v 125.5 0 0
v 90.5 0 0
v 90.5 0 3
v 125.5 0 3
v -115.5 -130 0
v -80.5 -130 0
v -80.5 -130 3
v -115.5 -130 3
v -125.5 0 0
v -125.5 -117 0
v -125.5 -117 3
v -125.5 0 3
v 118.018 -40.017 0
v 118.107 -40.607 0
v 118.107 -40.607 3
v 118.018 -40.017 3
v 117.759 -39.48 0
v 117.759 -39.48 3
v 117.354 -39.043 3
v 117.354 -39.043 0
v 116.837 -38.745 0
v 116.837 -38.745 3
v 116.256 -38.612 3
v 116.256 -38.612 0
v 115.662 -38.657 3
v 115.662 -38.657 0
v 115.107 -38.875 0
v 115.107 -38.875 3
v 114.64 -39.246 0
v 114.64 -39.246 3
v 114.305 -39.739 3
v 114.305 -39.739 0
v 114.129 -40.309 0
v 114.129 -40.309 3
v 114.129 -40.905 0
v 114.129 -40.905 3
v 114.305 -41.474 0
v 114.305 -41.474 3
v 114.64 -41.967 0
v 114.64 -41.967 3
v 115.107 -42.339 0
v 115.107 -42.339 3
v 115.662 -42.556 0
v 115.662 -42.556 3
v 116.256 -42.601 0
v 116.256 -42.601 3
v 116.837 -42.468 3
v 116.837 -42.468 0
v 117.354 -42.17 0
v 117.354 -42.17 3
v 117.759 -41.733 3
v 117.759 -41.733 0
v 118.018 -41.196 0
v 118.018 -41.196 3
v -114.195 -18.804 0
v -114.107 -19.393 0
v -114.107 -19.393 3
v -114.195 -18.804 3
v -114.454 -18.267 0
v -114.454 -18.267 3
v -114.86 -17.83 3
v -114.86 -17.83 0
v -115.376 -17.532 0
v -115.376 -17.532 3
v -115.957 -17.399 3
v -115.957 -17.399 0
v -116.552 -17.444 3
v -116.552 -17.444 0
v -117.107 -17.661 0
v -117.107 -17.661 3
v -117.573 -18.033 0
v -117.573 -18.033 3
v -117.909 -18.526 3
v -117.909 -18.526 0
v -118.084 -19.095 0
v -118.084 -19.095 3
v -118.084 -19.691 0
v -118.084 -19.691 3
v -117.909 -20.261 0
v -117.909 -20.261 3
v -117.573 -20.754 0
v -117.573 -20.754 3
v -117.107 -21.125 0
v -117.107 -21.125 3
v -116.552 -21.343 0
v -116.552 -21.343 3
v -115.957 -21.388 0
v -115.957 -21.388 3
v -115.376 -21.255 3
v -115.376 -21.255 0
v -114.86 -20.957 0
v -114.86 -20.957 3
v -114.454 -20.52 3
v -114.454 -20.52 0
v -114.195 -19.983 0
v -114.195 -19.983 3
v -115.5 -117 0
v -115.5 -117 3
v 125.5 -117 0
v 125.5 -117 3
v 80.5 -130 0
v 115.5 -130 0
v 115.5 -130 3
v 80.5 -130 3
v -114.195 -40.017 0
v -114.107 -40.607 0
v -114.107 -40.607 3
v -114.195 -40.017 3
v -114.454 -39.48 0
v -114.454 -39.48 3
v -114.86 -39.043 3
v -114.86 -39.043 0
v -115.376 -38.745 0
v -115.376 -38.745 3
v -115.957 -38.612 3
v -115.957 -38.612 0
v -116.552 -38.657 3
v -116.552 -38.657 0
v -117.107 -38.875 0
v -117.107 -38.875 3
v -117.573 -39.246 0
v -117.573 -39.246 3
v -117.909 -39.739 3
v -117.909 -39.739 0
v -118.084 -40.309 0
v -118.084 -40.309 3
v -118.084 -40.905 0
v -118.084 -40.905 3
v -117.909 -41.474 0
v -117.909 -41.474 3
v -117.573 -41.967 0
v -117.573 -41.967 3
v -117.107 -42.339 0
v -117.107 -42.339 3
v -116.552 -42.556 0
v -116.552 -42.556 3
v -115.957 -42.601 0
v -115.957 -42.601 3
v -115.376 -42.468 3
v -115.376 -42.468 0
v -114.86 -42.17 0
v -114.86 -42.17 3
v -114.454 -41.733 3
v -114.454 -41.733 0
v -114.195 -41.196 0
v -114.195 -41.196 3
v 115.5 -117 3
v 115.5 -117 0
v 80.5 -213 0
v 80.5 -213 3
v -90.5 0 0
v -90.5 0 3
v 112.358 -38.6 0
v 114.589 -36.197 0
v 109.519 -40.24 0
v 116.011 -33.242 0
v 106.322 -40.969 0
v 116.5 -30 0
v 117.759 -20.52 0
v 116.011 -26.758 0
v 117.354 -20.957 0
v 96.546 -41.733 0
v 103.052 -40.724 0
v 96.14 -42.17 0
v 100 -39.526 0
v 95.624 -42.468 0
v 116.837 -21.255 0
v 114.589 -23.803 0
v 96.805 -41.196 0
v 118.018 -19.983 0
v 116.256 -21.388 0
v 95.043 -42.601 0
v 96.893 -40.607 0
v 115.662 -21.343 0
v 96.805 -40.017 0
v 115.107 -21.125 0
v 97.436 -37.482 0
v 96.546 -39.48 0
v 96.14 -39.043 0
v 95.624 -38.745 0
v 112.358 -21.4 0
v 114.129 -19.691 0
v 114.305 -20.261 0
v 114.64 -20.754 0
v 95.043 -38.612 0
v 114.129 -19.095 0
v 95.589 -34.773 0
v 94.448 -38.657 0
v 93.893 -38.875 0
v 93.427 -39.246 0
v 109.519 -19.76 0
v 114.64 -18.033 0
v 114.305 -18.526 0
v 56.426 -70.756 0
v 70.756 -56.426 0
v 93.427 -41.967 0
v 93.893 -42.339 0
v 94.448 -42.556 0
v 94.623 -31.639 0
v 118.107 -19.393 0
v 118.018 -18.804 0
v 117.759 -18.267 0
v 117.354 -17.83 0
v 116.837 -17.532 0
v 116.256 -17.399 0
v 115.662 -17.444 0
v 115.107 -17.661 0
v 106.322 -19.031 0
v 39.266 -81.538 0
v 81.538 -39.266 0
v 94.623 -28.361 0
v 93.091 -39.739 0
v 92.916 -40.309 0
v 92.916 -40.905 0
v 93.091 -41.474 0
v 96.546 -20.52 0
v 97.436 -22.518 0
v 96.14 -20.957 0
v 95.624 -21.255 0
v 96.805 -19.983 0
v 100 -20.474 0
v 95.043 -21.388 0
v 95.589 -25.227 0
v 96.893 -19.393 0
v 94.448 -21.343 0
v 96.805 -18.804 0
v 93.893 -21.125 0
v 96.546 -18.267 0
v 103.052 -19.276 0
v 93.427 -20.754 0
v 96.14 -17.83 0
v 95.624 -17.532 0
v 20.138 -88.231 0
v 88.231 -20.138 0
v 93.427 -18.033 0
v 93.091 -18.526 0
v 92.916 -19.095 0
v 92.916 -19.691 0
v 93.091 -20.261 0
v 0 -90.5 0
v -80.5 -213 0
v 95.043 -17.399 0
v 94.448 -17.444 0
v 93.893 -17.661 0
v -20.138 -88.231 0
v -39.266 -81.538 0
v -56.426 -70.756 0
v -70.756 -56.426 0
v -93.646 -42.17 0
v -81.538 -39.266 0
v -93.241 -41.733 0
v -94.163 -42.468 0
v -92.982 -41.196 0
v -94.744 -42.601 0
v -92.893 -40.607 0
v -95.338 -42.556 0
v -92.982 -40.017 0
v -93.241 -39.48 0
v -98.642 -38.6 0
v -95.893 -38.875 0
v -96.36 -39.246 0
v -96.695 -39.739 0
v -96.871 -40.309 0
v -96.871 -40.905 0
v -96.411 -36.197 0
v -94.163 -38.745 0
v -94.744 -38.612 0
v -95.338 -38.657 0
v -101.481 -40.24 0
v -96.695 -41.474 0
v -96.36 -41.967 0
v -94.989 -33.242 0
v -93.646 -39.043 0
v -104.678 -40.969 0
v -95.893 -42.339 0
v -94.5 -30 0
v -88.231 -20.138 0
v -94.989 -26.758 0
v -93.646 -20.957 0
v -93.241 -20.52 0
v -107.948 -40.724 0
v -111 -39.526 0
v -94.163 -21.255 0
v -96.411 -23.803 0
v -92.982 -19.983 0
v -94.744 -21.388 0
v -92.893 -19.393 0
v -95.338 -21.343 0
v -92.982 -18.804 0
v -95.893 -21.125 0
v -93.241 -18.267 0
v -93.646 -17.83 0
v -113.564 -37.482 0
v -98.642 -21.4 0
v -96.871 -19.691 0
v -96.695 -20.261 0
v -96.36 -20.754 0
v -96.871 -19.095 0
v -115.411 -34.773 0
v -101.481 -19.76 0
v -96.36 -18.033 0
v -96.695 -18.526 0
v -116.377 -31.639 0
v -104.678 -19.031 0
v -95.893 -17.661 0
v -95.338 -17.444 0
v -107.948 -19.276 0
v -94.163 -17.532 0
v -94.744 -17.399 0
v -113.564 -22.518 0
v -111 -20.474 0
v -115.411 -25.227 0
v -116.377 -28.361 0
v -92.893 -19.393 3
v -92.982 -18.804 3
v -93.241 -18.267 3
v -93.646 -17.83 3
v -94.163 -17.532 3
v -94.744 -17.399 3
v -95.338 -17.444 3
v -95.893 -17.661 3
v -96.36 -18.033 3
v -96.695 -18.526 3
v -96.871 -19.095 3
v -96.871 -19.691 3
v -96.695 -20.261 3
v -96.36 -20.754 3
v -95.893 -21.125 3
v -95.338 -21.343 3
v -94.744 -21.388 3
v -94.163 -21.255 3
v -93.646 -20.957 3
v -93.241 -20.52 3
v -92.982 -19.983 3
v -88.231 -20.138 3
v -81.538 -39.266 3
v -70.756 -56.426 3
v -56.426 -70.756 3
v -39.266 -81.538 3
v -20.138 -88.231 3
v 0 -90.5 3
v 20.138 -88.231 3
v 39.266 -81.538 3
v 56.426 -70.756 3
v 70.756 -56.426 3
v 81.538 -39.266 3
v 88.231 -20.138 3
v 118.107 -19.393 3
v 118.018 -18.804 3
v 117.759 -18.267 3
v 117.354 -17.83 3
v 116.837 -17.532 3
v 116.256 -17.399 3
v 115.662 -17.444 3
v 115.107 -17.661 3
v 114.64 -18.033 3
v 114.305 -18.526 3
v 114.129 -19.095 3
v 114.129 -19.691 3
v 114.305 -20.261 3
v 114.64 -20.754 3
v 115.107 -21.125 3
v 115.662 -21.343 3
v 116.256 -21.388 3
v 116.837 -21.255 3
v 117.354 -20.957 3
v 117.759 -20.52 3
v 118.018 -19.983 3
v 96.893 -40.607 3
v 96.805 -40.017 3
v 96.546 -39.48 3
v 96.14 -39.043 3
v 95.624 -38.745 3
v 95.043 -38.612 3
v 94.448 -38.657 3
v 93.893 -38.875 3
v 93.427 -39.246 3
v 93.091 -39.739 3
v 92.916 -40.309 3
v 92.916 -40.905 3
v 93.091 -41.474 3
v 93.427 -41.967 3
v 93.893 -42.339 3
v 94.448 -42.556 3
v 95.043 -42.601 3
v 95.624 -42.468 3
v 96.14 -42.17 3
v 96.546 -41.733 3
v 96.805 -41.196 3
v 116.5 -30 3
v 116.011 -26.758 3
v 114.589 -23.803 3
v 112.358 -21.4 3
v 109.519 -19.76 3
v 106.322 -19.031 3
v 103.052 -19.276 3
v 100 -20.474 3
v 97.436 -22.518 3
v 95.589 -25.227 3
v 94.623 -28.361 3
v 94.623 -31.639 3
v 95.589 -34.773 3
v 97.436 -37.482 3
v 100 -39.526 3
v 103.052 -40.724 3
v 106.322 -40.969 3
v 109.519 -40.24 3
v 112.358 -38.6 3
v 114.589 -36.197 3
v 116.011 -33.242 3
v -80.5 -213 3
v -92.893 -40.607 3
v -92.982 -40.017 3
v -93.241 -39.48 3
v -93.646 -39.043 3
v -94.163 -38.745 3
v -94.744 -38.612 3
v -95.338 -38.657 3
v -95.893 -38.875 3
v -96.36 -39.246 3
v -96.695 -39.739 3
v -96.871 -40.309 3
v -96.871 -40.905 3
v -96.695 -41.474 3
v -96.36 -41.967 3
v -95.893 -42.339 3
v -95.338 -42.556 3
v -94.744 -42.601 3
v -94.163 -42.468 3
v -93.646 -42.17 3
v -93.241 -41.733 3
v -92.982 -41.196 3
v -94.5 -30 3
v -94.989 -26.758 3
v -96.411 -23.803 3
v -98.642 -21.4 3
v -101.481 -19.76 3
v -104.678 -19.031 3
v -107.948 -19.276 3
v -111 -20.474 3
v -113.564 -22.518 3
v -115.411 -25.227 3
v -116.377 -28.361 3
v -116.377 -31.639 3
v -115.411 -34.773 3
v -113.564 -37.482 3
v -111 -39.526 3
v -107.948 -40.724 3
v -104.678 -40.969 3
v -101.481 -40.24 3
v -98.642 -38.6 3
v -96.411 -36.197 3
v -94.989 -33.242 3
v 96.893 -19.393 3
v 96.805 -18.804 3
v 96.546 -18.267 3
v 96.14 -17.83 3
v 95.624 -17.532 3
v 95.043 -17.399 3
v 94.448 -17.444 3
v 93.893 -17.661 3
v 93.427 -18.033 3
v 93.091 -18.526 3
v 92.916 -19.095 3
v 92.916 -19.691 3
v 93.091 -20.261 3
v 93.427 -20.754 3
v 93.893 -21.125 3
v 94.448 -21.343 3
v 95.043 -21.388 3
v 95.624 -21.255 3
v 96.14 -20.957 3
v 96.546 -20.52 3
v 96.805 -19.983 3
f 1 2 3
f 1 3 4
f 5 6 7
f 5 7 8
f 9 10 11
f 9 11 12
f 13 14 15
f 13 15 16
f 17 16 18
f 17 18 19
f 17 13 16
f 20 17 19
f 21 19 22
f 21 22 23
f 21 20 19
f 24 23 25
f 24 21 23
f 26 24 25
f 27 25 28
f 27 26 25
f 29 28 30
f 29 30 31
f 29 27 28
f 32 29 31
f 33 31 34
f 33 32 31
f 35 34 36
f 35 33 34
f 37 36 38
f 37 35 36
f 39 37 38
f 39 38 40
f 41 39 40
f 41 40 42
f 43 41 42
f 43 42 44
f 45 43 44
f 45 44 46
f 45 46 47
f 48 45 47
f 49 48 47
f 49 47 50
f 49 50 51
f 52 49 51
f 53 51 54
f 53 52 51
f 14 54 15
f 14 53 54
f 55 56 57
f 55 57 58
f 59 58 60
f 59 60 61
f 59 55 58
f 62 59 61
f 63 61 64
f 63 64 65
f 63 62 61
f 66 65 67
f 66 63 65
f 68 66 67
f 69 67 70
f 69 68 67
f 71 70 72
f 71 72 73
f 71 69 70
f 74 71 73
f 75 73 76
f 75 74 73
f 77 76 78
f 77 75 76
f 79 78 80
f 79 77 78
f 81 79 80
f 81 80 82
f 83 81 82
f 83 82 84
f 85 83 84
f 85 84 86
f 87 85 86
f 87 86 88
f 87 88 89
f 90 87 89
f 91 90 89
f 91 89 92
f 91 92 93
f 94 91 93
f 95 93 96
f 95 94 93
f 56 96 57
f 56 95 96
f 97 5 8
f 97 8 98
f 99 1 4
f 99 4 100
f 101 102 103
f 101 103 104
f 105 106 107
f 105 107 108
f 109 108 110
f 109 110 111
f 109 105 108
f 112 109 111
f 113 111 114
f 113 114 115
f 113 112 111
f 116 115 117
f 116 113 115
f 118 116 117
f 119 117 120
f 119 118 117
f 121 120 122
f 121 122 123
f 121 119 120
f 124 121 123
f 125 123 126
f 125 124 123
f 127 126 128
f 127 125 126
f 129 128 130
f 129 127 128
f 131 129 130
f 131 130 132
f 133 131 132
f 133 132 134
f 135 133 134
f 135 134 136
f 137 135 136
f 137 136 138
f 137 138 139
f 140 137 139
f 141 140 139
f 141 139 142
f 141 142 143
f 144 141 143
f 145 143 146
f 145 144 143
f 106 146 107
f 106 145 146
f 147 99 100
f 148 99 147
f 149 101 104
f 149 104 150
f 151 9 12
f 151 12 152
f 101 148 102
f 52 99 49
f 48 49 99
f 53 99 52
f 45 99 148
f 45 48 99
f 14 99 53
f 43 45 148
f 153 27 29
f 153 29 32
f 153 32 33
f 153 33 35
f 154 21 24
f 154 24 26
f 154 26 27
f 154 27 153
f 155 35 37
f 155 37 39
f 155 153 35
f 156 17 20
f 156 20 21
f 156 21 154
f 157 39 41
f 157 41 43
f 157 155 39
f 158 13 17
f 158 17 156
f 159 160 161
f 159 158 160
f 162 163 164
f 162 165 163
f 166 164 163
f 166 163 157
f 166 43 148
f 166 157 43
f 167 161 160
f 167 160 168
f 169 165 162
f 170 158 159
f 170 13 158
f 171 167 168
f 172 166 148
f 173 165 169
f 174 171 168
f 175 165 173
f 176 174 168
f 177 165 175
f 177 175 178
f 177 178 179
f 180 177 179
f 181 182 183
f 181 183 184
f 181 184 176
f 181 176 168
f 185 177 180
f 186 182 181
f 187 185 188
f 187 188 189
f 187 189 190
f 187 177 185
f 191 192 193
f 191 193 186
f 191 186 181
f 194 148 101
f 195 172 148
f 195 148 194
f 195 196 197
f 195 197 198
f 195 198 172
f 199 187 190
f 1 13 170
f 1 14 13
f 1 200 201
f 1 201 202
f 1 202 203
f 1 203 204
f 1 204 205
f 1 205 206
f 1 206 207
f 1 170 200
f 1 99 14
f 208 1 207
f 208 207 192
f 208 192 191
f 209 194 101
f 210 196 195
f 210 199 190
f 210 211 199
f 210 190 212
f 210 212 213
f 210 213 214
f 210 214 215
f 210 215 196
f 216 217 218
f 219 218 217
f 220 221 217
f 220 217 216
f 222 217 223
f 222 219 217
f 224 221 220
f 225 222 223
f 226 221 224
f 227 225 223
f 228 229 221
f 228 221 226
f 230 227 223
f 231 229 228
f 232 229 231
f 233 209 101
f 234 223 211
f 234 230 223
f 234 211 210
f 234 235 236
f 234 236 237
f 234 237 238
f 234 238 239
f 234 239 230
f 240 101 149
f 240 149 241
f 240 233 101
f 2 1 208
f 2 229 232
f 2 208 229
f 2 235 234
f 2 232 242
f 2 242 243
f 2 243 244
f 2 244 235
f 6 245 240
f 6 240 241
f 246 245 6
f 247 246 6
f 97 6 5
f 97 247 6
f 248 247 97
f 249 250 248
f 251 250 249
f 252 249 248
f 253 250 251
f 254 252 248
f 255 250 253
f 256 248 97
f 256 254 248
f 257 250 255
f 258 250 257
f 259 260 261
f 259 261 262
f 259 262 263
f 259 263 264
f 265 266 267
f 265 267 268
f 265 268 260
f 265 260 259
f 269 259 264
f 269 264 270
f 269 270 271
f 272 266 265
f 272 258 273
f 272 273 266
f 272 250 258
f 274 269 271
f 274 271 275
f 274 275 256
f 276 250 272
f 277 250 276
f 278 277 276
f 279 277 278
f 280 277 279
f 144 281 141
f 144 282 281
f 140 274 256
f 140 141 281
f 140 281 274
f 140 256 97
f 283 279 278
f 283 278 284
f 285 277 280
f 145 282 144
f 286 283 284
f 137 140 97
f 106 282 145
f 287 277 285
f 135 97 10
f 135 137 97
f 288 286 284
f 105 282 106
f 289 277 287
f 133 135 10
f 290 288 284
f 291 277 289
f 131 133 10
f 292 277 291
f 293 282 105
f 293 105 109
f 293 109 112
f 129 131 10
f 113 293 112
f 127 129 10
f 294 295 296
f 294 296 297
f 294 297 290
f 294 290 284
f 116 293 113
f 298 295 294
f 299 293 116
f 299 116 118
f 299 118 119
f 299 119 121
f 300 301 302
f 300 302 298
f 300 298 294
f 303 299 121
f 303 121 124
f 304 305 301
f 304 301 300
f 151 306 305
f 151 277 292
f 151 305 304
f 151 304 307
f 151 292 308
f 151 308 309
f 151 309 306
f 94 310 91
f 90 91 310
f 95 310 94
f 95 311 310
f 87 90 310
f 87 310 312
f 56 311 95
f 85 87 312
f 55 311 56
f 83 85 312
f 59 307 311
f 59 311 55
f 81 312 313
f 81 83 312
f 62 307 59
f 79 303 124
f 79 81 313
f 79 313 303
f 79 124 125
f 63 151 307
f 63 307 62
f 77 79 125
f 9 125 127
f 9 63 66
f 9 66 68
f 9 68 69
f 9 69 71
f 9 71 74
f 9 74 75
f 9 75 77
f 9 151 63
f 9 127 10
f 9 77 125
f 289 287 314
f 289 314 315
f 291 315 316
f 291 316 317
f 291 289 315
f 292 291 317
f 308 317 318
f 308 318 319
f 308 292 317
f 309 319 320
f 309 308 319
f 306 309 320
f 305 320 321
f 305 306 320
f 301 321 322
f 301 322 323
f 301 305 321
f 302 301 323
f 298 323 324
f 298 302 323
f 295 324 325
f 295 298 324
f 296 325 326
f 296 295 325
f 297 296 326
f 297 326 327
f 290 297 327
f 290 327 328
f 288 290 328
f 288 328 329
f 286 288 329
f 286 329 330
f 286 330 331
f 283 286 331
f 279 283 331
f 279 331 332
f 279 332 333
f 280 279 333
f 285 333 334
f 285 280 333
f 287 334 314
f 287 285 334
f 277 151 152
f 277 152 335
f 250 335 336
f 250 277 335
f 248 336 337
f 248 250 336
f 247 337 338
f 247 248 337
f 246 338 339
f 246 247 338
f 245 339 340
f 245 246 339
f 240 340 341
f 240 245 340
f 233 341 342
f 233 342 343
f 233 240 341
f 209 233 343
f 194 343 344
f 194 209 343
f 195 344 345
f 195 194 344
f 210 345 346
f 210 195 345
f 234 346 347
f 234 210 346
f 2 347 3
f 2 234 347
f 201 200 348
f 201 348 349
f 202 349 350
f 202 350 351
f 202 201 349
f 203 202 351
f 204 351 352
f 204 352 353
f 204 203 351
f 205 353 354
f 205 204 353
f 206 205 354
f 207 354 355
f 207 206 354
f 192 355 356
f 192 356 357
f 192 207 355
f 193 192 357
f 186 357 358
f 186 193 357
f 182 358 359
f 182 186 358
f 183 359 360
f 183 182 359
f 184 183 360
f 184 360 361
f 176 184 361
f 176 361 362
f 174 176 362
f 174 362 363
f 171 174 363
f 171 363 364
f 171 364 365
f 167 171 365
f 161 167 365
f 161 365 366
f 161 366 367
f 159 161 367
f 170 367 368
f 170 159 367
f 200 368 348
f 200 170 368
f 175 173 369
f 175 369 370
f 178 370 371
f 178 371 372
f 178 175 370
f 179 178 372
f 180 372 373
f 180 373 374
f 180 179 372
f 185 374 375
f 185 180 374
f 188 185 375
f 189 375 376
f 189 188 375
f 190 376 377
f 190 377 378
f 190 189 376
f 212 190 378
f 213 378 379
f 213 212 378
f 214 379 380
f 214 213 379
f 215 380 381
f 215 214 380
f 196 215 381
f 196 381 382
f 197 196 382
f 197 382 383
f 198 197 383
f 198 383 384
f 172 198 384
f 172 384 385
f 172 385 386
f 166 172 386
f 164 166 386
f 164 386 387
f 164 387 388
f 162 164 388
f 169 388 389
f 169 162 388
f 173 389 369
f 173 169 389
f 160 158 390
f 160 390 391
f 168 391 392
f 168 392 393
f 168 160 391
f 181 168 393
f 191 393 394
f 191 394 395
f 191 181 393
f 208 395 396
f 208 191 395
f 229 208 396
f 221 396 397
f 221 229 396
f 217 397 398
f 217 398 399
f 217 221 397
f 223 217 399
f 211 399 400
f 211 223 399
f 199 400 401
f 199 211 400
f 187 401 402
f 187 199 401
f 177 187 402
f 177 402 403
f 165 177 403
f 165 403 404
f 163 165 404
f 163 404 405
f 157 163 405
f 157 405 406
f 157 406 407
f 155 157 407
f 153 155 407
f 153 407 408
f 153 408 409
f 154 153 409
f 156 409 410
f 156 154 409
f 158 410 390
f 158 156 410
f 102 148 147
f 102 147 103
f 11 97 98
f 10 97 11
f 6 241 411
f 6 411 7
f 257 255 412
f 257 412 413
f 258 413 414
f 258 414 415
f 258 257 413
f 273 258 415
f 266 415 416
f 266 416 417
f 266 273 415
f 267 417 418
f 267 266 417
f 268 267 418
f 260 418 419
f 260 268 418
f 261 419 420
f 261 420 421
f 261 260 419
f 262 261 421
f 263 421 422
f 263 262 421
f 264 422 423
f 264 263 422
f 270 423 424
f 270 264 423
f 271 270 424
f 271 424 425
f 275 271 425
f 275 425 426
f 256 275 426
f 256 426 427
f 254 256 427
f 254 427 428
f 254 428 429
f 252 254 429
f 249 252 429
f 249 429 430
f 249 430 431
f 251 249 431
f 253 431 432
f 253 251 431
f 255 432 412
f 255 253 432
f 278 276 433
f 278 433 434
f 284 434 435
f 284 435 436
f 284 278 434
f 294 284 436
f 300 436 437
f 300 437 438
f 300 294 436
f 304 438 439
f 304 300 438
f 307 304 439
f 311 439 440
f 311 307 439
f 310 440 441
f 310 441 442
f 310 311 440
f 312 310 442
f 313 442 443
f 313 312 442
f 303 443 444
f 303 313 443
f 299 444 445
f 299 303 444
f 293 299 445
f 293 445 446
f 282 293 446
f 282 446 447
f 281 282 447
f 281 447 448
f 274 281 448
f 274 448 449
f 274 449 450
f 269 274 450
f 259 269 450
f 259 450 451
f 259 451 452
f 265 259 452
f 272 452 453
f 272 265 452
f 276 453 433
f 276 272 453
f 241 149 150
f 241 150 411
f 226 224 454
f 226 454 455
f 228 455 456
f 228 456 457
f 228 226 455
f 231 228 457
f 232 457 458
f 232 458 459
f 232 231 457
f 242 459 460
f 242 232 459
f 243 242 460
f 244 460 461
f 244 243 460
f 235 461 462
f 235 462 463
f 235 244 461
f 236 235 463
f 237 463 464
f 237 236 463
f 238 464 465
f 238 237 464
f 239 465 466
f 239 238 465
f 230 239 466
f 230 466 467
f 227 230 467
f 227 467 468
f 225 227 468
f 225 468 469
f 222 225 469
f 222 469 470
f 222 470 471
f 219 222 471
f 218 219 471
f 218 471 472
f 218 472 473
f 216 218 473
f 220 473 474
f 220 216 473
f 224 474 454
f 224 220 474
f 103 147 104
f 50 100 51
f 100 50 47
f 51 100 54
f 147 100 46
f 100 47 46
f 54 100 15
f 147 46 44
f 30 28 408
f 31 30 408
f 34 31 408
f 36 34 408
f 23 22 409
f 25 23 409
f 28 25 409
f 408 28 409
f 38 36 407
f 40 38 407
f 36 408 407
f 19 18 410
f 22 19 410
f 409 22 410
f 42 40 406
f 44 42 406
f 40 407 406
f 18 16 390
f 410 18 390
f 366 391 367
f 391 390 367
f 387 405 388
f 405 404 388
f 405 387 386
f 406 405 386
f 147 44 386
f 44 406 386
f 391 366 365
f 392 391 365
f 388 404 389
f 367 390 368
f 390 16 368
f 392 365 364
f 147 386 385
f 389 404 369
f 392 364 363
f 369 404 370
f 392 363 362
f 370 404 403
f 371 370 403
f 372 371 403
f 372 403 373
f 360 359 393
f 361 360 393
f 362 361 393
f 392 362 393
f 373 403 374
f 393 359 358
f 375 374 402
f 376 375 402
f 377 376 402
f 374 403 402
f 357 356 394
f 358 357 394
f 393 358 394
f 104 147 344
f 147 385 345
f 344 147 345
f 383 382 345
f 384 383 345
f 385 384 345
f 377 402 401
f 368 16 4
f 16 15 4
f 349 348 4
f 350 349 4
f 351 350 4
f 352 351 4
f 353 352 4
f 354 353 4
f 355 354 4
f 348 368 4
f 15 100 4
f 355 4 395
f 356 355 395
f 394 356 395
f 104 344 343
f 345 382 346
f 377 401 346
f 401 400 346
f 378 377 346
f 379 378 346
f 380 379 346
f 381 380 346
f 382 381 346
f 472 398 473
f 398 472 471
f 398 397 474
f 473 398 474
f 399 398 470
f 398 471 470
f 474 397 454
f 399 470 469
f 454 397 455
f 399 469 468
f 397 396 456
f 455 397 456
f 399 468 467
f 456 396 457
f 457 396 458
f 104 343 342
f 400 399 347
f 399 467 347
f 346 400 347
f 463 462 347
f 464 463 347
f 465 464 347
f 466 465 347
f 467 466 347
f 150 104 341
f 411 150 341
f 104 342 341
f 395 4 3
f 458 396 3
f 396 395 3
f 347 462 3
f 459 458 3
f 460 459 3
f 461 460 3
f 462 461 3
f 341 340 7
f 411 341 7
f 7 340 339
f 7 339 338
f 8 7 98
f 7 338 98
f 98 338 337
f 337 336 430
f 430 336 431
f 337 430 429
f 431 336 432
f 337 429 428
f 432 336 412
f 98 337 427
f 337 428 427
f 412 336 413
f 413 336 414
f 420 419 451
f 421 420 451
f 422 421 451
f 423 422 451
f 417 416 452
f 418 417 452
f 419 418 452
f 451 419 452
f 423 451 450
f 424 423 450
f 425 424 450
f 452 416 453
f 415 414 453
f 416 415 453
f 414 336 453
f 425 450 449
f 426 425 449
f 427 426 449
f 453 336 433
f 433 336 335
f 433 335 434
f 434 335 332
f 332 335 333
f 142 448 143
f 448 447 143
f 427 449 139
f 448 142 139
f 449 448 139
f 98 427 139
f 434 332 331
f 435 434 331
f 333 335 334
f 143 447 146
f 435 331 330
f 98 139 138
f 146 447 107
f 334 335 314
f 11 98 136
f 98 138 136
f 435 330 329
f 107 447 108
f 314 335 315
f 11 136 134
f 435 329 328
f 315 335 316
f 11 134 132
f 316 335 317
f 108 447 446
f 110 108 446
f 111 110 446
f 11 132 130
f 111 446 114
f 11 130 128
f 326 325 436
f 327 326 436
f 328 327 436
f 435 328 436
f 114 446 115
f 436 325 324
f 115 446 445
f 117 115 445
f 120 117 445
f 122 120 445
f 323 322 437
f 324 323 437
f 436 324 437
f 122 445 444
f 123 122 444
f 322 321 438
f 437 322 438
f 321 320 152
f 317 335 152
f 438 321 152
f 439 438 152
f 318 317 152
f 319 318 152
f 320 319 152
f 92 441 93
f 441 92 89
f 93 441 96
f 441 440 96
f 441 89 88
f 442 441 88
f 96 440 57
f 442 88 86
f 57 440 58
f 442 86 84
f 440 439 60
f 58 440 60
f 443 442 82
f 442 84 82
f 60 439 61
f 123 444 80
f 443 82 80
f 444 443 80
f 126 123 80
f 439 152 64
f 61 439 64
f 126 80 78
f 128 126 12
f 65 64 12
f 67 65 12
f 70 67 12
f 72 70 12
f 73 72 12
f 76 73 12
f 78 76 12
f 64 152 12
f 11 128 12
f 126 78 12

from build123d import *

# Parameters (mm, degrees)
ESQUISSE1_R      = 11
ESQUISSE1_R_2    = 2
EXTRUSION1_DEPTH = 3


with BuildPart() as part:
    # Esquisse1 → Extrusion1 (new body)
    with BuildSketch(Plane.XY):
        with BuildLine():
            Line((125.5, 0), (125.5, -117))
            Line((125.5, -117), (115.5, -117))
            Line((115.5, -117), (115.5, -130))
            Line((115.5, -130), (80.5, -130))
            Line((80.5, -130), (80.5, -213))
            Line((80.5, -213), (-80.5, -213))
            Line((-80.5, -213), (-80.5, -130))
            Line((-80.5, -130), (-115.5, -130))
            Line((-115.5, -130), (-115.5, -117))
            Line((-115.5, -117), (-125.5, -117))
            Line((-125.5, -117), (-125.5, 0))
            Line((-125.5, 0), (-90.5, 0))
            ThreePointArc((-90.5, 0), (0, -90.5), (90.5, 0))
            Line((90.5, 0), (125.5, 0))
        make_face()
        with Locations((-105.5, -30)):
            Circle(ESQUISSE1_R, mode=Mode.SUBTRACT)
        with Locations((116.106601718, -19.393398282)):
            Circle(ESQUISSE1_R_2, mode=Mode.SUBTRACT)
        with Locations((94.893398282, -40.606601718)):
            Circle(ESQUISSE1_R_2, mode=Mode.SUBTRACT)
        with Locations((-94.893398282, -19.393398282)):
            Circle(ESQUISSE1_R_2, mode=Mode.SUBTRACT)
        with Locations((-116.106601718, -40.606601718)):
            Circle(ESQUISSE1_R_2, mode=Mode.SUBTRACT)
        with Locations((-94.893398282, -40.606601718)):
            Circle(ESQUISSE1_R_2, mode=Mode.SUBTRACT)
        with Locations((116.106601718, -40.606601718)):
            Circle(ESQUISSE1_R_2, mode=Mode.SUBTRACT)
        with Locations((94.893398282, -19.393398282)):
            Circle(ESQUISSE1_R_2, mode=Mode.SUBTRACT)
        with Locations((105.5, -30)):
            Circle(ESQUISSE1_R, mode=Mode.SUBTRACT)
        with Locations((-116.106601718, -19.393398282)):
            Circle(ESQUISSE1_R_2, mode=Mode.SUBTRACT)
    extrude(amount=EXTRUSION1_DEPTH)


solid = part.part
